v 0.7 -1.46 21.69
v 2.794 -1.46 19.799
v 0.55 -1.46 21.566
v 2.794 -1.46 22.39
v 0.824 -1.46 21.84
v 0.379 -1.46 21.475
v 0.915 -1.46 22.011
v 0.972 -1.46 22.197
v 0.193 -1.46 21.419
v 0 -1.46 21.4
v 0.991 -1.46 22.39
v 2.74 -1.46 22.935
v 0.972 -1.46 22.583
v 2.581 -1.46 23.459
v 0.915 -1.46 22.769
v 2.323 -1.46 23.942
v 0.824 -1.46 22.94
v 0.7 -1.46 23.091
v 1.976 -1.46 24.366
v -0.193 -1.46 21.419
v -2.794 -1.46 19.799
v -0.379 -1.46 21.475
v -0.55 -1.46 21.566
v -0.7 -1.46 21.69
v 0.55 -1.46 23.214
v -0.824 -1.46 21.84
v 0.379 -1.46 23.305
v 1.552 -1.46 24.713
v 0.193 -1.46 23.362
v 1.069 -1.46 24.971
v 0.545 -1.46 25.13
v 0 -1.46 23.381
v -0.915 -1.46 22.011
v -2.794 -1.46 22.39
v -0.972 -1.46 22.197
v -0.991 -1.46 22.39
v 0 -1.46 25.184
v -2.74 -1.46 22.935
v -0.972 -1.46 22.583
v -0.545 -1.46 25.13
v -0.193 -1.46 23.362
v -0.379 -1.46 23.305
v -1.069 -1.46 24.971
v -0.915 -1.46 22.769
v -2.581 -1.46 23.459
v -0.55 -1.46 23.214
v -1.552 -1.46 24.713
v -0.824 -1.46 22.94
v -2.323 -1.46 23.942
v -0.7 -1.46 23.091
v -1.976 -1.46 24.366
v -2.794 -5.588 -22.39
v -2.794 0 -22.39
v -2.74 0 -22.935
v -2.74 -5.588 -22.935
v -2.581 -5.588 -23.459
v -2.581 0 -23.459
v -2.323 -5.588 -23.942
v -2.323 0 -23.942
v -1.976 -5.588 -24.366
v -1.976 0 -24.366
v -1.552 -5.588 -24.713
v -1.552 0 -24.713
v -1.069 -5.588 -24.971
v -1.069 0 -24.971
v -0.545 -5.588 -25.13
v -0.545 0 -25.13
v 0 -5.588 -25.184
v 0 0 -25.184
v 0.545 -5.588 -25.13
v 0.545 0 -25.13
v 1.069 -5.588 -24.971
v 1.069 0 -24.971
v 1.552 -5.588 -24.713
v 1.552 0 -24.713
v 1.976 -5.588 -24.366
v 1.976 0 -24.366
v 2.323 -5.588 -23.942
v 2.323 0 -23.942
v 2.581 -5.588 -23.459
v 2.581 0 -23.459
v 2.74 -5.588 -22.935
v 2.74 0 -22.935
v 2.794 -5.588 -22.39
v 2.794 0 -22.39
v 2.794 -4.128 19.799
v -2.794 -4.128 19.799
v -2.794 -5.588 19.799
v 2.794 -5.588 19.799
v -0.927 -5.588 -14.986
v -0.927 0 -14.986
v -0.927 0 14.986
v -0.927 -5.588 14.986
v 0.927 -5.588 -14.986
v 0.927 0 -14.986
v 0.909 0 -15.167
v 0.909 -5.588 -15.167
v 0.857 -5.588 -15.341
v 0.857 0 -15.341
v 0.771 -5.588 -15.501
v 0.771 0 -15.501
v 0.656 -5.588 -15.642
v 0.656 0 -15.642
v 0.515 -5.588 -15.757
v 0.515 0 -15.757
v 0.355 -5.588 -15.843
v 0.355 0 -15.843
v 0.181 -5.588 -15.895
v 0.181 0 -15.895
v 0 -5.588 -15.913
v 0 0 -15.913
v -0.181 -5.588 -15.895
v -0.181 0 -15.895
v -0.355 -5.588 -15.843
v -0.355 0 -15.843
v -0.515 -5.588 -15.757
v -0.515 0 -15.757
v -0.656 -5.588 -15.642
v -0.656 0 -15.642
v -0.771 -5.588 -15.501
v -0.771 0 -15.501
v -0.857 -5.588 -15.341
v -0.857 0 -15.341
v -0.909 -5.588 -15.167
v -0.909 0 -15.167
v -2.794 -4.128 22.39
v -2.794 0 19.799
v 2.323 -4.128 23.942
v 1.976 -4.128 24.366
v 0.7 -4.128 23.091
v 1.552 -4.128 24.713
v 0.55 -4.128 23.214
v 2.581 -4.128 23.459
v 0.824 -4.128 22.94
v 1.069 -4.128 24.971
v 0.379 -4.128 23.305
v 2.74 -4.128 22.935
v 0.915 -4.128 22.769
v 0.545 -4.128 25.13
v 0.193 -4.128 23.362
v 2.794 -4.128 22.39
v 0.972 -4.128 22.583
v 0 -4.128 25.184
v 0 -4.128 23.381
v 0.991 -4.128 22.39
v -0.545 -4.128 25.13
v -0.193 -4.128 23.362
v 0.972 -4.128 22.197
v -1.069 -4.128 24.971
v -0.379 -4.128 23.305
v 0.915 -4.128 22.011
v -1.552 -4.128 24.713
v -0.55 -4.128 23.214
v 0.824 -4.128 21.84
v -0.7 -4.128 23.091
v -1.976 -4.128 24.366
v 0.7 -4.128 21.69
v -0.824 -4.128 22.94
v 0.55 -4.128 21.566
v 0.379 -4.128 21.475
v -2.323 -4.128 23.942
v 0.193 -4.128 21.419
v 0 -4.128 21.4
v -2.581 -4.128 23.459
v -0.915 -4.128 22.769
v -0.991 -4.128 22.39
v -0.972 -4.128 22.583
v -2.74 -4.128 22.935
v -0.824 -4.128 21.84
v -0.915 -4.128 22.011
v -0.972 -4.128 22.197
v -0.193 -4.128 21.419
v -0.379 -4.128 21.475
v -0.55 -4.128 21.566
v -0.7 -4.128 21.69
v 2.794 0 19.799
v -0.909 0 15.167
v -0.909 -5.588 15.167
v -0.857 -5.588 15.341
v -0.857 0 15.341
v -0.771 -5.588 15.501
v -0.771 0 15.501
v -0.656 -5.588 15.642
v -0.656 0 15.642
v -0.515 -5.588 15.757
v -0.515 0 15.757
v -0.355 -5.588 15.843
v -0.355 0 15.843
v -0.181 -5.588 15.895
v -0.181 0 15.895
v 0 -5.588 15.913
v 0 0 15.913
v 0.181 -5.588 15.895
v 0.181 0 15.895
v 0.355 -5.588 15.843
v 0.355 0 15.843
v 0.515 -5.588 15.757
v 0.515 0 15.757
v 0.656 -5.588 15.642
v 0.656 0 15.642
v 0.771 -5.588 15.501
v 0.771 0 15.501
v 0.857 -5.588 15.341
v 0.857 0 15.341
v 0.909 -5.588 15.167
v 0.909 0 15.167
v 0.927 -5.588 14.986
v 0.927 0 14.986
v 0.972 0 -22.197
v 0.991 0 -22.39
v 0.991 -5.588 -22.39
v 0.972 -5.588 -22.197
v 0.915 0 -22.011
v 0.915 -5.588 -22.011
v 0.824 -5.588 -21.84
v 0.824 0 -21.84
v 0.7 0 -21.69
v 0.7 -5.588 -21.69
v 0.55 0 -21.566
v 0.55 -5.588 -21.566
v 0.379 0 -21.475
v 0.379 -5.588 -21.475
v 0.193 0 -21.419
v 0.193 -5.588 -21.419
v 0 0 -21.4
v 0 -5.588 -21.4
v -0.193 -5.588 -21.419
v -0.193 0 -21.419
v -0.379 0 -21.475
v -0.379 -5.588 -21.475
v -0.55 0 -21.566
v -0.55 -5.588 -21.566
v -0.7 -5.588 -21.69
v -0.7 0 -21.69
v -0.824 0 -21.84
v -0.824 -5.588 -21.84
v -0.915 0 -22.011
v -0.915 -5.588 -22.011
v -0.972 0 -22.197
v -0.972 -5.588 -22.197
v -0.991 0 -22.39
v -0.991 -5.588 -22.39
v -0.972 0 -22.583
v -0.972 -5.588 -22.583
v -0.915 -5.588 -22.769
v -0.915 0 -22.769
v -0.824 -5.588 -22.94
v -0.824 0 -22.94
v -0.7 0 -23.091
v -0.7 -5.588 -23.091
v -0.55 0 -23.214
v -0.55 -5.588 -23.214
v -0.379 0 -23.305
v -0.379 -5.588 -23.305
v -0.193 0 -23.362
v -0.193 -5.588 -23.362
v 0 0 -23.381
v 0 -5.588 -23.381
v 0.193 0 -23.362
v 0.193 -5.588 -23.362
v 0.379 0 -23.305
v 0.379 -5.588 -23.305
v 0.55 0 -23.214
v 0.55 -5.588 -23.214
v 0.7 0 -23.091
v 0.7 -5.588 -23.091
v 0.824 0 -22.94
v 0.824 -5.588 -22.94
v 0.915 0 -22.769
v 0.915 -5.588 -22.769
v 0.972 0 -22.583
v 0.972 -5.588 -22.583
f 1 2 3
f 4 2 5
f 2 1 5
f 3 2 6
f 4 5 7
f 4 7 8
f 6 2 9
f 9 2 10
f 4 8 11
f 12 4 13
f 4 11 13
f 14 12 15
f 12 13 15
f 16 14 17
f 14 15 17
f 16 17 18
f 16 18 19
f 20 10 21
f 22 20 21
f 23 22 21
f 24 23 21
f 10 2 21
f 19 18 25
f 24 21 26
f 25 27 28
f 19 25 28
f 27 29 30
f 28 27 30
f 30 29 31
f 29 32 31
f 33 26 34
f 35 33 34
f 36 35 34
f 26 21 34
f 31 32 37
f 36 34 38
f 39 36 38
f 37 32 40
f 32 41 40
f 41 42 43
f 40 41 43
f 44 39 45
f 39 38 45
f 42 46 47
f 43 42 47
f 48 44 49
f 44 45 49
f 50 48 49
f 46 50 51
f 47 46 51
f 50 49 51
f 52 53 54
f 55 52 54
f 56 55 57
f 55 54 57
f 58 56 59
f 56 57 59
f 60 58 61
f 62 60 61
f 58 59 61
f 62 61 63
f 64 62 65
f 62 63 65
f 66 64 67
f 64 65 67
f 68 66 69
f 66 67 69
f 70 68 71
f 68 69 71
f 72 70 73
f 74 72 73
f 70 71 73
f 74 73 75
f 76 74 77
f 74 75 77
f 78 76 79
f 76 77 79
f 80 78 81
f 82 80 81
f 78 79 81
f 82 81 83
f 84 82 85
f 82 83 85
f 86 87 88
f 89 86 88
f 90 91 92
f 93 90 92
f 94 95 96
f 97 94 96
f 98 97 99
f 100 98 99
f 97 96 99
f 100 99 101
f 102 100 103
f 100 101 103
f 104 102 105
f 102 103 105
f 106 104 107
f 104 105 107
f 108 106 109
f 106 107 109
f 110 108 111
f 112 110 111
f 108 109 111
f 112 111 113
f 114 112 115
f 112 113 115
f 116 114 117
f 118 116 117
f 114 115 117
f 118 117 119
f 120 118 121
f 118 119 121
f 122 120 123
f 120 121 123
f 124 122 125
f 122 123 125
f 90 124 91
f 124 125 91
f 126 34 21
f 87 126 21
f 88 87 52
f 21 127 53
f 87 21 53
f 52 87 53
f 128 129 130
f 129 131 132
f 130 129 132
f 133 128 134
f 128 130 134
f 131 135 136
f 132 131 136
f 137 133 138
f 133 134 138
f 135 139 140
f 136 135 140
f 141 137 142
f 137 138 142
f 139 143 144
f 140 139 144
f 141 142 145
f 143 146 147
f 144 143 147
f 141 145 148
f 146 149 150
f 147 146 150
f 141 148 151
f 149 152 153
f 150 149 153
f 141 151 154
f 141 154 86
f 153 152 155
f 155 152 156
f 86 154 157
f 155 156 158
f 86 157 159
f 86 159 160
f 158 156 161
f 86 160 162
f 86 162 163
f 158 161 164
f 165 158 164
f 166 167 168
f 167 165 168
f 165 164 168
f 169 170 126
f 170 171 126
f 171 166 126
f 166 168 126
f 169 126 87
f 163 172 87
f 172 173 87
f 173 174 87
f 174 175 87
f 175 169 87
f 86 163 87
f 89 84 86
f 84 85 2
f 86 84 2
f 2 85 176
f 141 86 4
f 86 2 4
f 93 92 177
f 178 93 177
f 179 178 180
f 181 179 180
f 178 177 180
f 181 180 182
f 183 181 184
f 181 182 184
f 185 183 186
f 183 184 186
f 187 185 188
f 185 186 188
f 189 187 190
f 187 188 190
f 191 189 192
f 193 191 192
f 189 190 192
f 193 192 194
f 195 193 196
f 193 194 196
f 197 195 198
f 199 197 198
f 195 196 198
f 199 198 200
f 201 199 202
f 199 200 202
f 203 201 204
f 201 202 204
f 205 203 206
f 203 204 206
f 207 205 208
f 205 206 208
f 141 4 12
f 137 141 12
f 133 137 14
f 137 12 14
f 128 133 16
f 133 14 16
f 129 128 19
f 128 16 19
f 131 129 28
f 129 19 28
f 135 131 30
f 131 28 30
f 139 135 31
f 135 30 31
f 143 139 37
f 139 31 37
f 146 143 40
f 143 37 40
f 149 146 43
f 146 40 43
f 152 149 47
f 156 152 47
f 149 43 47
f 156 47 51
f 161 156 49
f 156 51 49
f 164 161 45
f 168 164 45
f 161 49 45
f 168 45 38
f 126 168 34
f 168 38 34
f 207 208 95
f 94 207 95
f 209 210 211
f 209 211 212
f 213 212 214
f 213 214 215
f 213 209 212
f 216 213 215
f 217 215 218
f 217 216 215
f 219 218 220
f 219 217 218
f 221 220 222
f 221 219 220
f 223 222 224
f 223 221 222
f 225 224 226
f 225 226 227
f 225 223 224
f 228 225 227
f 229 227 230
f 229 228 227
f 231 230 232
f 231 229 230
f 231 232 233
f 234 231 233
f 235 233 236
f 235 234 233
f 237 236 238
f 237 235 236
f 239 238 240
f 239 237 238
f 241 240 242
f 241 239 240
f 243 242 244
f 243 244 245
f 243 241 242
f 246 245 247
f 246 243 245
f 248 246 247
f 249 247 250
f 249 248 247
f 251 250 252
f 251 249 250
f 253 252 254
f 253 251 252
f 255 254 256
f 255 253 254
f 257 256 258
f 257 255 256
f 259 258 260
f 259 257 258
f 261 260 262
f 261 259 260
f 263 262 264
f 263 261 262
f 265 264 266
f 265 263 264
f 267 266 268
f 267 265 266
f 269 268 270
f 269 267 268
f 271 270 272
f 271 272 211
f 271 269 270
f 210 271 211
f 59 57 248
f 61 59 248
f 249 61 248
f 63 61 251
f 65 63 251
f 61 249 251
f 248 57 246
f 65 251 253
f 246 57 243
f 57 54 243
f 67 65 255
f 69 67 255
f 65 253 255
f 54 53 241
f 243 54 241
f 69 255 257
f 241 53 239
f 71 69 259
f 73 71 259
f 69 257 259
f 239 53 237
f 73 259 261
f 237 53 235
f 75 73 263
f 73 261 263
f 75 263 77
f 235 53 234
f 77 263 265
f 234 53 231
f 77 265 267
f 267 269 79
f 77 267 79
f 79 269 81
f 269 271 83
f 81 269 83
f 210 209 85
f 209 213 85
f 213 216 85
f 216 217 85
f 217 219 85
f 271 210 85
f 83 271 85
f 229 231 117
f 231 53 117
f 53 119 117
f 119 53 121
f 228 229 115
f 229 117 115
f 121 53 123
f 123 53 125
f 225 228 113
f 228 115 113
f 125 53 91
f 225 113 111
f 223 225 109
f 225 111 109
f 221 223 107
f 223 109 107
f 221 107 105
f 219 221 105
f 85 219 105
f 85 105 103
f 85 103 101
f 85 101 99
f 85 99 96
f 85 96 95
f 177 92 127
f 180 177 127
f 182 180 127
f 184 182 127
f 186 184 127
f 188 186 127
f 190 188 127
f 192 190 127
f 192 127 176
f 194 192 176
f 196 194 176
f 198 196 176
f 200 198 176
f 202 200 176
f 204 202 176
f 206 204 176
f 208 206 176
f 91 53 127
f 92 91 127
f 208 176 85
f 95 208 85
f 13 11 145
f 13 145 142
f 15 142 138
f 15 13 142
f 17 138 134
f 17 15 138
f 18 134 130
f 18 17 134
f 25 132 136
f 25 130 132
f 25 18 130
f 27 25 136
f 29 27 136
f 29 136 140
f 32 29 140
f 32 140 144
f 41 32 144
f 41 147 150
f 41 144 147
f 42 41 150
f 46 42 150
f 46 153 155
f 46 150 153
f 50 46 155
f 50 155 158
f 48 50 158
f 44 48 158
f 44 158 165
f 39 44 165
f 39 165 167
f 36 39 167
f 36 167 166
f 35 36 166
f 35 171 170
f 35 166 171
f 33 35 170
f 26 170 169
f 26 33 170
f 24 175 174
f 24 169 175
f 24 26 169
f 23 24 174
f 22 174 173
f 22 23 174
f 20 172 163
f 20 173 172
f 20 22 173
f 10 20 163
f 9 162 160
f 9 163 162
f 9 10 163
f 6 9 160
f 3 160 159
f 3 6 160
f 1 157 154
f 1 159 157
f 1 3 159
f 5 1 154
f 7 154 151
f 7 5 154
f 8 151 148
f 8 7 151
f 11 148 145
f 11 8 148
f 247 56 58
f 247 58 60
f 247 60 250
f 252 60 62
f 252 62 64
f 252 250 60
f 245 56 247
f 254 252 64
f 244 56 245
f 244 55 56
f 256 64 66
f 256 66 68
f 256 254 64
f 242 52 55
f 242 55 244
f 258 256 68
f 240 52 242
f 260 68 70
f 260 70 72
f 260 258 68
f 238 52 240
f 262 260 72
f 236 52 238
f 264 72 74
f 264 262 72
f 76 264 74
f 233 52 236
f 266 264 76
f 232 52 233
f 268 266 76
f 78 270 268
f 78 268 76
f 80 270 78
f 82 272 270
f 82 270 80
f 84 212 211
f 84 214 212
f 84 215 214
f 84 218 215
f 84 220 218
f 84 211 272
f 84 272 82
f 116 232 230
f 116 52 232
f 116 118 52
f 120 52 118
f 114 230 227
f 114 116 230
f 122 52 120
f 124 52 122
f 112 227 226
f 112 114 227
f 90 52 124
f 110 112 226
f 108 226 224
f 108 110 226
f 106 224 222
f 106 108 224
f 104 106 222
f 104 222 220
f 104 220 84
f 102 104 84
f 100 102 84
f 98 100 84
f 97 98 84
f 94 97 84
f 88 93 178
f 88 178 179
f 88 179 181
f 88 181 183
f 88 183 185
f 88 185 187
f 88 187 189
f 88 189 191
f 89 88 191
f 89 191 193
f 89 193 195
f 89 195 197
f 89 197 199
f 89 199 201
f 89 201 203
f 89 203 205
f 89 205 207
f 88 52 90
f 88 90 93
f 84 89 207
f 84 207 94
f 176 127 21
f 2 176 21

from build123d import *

# Parameters (mm, degrees)
F0_W     = 5.588
F0_H     = 33.6042
F0_R     = 0.9906
F2_DEPTH = 5.588
F3_W     = 1.4605
F3_H     = 2.5908
F3_H_2   = 2.794
F4_DEPTH = 5.589


# Not quite as in the source:
# - the program builds the solid bodies; features that only make, move or delete a surface that nothing else refers to are left out


with BuildPart() as f2:
    # F0 (on Front) → F2 (new body)
    with BuildSketch(Plane.XZ):
        Rectangle(F0_W, F0_H)
        with BuildLine():
            ThreePointArc((-0.9271, 14.986), (0, 15.9131), (0.9271, 14.986))
            Line((0.9271, 14.986), (0.9271, -14.986))
            ThreePointArc((0.9271, -14.986), (0, -15.9131), (-0.9271, -14.986))
            Line((-0.9271, -14.986), (-0.9271, 14.986))
        make_face(mode=Mode.SUBTRACT)
        with BuildLine():
            Line((-2.794, 16.8021), (2.794, 16.8021))
            Line((2.794, 16.8021), (2.794, 22.3901))
            ThreePointArc((2.794, 22.3901), (0, 25.1841), (-2.794, 22.3901))
            Line((-2.794, 22.3901), (-2.794, 16.8021))
        make_face()
        with Locations((0, 22.3901)):
            Circle(F0_R, mode=Mode.SUBTRACT)
        with BuildLine():
            Line((2.794, -22.3901), (2.794, -16.8021))
            Line((2.794, -16.8021), (-2.794, -16.8021))
            Line((-2.794, -16.8021), (-2.794, -22.3901))
            ThreePointArc((-2.794, -22.3901), (0, -25.1841), (2.794, -22.3901))
        make_face()
        with Locations((0, -22.3901)):
            Circle(F0_R, mode=Mode.SUBTRACT)
    extrude(amount=F2_DEPTH)

    # F3 (on face) → F4 (cut, through all)
    with BuildSketch(Plane(origin=(-2.794, 0, 0), x_dir=(0, -1, 0), z_dir=(-1, 0, 0))):
        with Locations((0.73025, 21.0947)):
            Rectangle(F3_W, F3_H)
        with Locations((0.73025, 23.7871)):
            Rectangle(F3_W, F3_H_2)
        with Locations((4.85775, 23.7871)):
            Rectangle(F3_W, F3_H_2)
        with Locations((4.85775, 21.0947)):
            Rectangle(F3_W, F3_H)
    extrude(amount=-F4_DEPTH, mode=Mode.SUBTRACT)


solid = f2.part
